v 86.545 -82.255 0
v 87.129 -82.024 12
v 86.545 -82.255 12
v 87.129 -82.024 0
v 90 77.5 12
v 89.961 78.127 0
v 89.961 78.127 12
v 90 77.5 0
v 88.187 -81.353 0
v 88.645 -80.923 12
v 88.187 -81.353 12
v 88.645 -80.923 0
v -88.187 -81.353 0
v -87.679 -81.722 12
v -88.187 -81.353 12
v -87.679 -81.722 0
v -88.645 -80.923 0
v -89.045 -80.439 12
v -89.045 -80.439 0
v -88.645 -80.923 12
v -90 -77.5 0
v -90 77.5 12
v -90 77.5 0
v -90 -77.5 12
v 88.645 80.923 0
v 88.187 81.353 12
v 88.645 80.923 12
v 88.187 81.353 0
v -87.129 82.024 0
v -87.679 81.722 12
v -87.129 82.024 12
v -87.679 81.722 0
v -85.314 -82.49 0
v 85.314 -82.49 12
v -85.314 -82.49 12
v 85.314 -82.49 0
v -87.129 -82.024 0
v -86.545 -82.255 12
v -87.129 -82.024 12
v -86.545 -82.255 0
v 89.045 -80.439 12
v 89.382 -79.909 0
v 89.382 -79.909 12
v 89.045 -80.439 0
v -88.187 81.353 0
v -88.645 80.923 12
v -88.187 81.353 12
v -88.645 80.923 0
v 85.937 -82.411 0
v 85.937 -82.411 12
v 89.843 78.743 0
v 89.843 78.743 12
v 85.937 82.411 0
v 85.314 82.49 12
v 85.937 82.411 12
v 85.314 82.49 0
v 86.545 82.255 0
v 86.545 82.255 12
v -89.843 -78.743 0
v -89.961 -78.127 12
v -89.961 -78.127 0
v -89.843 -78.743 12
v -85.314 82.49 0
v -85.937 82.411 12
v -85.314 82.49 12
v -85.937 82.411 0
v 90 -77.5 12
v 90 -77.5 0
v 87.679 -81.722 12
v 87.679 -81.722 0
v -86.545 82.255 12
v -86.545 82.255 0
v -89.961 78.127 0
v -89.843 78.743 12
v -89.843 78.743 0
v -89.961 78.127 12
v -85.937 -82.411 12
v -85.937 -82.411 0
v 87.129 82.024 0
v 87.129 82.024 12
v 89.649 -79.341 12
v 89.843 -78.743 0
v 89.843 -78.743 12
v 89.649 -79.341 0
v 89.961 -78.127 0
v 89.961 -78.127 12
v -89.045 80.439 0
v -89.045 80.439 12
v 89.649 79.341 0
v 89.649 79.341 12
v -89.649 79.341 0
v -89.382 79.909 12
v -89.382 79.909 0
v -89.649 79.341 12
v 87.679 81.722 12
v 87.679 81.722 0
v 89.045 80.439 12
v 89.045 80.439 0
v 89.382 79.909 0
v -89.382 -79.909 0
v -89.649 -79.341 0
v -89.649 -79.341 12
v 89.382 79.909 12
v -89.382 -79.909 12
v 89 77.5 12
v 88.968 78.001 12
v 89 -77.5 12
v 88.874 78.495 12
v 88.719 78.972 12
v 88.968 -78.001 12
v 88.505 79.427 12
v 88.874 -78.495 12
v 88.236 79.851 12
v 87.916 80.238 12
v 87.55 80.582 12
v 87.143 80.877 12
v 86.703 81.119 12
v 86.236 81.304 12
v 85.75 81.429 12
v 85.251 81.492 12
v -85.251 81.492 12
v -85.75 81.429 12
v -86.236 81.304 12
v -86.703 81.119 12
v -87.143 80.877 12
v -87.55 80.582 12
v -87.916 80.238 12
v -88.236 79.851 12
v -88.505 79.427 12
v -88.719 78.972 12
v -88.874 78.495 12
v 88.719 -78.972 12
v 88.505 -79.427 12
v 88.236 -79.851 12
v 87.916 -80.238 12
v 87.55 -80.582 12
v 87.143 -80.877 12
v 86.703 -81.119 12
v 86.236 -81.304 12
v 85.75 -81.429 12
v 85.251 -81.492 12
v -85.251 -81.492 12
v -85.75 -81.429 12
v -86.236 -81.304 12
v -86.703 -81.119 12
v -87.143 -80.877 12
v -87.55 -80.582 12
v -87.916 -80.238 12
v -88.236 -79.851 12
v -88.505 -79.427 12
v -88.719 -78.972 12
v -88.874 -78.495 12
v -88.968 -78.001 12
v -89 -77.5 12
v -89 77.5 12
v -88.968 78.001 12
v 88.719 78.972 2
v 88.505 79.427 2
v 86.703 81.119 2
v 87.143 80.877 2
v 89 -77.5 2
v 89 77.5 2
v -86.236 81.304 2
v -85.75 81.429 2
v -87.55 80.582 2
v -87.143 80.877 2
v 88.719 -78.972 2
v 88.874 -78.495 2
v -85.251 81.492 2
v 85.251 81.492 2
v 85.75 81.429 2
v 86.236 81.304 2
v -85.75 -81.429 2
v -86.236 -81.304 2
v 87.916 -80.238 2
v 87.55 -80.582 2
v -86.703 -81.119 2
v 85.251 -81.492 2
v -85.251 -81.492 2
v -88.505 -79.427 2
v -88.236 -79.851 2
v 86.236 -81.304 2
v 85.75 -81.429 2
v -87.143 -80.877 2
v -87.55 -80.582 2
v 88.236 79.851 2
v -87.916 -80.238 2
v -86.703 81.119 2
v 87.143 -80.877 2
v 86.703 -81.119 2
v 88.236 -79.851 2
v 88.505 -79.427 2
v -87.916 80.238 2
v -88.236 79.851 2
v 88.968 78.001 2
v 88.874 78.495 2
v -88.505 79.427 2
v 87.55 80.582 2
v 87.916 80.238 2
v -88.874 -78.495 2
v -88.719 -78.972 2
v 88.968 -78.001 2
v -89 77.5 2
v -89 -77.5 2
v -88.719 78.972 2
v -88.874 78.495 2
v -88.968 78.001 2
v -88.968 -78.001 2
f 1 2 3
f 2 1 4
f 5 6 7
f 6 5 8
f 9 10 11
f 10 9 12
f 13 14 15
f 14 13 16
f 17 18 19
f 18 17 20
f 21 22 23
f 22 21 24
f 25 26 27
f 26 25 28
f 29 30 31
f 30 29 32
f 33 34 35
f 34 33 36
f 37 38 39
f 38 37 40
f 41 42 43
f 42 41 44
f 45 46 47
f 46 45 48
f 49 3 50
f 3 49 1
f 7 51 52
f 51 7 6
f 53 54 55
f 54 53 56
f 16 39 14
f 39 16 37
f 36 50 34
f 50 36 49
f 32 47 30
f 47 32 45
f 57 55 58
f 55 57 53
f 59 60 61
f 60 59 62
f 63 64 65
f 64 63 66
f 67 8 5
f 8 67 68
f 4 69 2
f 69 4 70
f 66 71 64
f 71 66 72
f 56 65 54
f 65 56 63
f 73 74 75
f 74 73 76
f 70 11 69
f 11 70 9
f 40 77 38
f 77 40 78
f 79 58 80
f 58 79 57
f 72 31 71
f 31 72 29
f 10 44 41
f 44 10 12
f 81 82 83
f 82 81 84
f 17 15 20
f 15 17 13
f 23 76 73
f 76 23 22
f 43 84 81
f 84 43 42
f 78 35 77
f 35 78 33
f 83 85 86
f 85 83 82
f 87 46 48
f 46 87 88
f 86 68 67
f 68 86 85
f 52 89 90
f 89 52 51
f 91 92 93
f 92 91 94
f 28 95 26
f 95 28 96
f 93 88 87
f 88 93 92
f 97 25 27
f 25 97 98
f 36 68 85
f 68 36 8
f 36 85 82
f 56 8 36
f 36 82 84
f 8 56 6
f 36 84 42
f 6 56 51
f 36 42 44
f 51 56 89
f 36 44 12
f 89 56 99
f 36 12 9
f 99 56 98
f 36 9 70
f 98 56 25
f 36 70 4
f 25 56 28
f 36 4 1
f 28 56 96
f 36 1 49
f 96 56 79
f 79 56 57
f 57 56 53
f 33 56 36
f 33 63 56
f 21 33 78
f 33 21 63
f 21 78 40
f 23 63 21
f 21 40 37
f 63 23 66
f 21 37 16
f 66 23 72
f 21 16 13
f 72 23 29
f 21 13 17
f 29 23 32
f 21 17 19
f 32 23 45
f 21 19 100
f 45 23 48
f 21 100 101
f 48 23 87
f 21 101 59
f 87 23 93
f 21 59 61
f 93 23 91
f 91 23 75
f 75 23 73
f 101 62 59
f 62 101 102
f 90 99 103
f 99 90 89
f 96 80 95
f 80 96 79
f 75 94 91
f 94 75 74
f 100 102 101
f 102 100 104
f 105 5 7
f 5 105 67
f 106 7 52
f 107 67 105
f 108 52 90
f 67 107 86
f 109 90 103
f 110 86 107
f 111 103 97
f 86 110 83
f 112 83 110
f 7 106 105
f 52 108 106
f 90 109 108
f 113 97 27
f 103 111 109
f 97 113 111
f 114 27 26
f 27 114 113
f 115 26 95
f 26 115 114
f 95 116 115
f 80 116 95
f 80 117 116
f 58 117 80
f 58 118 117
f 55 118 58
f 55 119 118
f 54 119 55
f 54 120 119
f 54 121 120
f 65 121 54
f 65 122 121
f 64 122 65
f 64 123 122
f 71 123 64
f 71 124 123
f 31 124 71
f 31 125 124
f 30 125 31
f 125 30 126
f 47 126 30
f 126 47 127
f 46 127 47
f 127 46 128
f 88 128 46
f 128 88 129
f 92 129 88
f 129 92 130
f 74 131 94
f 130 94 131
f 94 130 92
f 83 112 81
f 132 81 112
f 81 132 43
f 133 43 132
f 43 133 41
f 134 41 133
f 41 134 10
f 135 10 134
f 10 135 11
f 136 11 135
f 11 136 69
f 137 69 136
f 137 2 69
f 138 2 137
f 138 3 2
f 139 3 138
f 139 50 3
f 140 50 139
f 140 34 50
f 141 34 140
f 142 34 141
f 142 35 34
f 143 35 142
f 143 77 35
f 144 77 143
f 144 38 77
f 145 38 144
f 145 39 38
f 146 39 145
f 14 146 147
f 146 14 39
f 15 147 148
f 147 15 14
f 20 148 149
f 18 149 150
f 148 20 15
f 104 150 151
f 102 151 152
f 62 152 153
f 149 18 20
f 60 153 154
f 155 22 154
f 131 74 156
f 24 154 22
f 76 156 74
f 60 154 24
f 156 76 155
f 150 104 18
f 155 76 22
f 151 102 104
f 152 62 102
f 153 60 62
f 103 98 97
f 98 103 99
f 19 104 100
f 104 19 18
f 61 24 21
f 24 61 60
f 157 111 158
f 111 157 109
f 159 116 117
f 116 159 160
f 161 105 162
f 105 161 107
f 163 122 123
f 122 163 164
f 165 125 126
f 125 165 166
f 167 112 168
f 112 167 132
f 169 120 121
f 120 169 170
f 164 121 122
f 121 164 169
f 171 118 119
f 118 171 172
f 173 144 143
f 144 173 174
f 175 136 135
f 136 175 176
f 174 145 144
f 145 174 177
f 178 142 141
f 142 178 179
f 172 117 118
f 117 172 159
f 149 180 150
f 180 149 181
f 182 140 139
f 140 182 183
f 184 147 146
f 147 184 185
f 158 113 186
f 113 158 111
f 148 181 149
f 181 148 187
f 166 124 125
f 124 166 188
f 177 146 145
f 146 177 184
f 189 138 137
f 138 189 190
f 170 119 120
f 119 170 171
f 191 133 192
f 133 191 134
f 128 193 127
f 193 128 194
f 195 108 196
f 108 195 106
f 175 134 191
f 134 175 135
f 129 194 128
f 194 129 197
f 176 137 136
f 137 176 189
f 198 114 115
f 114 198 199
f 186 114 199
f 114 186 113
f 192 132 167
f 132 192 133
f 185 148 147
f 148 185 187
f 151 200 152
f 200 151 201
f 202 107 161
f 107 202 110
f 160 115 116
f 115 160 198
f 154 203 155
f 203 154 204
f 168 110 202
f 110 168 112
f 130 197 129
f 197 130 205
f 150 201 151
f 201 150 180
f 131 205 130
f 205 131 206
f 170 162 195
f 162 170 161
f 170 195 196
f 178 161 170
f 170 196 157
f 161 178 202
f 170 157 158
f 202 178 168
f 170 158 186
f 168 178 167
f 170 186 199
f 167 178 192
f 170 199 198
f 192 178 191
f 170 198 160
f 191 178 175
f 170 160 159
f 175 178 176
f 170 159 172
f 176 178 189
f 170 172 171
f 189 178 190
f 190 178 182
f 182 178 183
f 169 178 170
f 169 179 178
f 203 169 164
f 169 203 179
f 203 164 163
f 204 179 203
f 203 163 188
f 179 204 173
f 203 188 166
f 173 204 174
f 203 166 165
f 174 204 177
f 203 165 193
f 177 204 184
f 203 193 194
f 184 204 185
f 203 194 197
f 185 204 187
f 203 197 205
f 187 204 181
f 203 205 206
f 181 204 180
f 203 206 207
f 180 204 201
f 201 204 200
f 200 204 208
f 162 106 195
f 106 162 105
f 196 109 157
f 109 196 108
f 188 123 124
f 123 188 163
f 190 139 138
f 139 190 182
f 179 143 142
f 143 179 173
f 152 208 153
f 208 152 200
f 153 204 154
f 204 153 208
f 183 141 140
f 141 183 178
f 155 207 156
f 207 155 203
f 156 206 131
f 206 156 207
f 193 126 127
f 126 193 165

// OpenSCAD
$fn = 50;


difference() {
	union() {
		hull() {
			translate(v = [-85.0000000000, 77.5000000000, 0]) {
				cylinder(h = 12, r = 5);
			}
			translate(v = [85.0000000000, 77.5000000000, 0]) {
				cylinder(h = 12, r = 5);
			}
			translate(v = [-85.0000000000, -77.5000000000, 0]) {
				cylinder(h = 12, r = 5);
			}
			translate(v = [85.0000000000, -77.5000000000, 0]) {
				cylinder(h = 12, r = 5);
			}
		}
	}
	union() {
		translate(v = [0, 0, 2]) {
			hull() {
				translate(v = [-85.0000000000, 77.5000000000, 0]) {
					cylinder(h = 10, r = 4);
				}
				translate(v = [85.0000000000, 77.5000000000, 0]) {
					cylinder(h = 10, r = 4);
				}
				translate(v = [-85.0000000000, -77.5000000000, 0]) {
					cylinder(h = 10, r = 4);
				}
				translate(v = [85.0000000000, -77.5000000000, 0]) {
					cylinder(h = 10, r = 4);
				}
			}
		}
	}
}
